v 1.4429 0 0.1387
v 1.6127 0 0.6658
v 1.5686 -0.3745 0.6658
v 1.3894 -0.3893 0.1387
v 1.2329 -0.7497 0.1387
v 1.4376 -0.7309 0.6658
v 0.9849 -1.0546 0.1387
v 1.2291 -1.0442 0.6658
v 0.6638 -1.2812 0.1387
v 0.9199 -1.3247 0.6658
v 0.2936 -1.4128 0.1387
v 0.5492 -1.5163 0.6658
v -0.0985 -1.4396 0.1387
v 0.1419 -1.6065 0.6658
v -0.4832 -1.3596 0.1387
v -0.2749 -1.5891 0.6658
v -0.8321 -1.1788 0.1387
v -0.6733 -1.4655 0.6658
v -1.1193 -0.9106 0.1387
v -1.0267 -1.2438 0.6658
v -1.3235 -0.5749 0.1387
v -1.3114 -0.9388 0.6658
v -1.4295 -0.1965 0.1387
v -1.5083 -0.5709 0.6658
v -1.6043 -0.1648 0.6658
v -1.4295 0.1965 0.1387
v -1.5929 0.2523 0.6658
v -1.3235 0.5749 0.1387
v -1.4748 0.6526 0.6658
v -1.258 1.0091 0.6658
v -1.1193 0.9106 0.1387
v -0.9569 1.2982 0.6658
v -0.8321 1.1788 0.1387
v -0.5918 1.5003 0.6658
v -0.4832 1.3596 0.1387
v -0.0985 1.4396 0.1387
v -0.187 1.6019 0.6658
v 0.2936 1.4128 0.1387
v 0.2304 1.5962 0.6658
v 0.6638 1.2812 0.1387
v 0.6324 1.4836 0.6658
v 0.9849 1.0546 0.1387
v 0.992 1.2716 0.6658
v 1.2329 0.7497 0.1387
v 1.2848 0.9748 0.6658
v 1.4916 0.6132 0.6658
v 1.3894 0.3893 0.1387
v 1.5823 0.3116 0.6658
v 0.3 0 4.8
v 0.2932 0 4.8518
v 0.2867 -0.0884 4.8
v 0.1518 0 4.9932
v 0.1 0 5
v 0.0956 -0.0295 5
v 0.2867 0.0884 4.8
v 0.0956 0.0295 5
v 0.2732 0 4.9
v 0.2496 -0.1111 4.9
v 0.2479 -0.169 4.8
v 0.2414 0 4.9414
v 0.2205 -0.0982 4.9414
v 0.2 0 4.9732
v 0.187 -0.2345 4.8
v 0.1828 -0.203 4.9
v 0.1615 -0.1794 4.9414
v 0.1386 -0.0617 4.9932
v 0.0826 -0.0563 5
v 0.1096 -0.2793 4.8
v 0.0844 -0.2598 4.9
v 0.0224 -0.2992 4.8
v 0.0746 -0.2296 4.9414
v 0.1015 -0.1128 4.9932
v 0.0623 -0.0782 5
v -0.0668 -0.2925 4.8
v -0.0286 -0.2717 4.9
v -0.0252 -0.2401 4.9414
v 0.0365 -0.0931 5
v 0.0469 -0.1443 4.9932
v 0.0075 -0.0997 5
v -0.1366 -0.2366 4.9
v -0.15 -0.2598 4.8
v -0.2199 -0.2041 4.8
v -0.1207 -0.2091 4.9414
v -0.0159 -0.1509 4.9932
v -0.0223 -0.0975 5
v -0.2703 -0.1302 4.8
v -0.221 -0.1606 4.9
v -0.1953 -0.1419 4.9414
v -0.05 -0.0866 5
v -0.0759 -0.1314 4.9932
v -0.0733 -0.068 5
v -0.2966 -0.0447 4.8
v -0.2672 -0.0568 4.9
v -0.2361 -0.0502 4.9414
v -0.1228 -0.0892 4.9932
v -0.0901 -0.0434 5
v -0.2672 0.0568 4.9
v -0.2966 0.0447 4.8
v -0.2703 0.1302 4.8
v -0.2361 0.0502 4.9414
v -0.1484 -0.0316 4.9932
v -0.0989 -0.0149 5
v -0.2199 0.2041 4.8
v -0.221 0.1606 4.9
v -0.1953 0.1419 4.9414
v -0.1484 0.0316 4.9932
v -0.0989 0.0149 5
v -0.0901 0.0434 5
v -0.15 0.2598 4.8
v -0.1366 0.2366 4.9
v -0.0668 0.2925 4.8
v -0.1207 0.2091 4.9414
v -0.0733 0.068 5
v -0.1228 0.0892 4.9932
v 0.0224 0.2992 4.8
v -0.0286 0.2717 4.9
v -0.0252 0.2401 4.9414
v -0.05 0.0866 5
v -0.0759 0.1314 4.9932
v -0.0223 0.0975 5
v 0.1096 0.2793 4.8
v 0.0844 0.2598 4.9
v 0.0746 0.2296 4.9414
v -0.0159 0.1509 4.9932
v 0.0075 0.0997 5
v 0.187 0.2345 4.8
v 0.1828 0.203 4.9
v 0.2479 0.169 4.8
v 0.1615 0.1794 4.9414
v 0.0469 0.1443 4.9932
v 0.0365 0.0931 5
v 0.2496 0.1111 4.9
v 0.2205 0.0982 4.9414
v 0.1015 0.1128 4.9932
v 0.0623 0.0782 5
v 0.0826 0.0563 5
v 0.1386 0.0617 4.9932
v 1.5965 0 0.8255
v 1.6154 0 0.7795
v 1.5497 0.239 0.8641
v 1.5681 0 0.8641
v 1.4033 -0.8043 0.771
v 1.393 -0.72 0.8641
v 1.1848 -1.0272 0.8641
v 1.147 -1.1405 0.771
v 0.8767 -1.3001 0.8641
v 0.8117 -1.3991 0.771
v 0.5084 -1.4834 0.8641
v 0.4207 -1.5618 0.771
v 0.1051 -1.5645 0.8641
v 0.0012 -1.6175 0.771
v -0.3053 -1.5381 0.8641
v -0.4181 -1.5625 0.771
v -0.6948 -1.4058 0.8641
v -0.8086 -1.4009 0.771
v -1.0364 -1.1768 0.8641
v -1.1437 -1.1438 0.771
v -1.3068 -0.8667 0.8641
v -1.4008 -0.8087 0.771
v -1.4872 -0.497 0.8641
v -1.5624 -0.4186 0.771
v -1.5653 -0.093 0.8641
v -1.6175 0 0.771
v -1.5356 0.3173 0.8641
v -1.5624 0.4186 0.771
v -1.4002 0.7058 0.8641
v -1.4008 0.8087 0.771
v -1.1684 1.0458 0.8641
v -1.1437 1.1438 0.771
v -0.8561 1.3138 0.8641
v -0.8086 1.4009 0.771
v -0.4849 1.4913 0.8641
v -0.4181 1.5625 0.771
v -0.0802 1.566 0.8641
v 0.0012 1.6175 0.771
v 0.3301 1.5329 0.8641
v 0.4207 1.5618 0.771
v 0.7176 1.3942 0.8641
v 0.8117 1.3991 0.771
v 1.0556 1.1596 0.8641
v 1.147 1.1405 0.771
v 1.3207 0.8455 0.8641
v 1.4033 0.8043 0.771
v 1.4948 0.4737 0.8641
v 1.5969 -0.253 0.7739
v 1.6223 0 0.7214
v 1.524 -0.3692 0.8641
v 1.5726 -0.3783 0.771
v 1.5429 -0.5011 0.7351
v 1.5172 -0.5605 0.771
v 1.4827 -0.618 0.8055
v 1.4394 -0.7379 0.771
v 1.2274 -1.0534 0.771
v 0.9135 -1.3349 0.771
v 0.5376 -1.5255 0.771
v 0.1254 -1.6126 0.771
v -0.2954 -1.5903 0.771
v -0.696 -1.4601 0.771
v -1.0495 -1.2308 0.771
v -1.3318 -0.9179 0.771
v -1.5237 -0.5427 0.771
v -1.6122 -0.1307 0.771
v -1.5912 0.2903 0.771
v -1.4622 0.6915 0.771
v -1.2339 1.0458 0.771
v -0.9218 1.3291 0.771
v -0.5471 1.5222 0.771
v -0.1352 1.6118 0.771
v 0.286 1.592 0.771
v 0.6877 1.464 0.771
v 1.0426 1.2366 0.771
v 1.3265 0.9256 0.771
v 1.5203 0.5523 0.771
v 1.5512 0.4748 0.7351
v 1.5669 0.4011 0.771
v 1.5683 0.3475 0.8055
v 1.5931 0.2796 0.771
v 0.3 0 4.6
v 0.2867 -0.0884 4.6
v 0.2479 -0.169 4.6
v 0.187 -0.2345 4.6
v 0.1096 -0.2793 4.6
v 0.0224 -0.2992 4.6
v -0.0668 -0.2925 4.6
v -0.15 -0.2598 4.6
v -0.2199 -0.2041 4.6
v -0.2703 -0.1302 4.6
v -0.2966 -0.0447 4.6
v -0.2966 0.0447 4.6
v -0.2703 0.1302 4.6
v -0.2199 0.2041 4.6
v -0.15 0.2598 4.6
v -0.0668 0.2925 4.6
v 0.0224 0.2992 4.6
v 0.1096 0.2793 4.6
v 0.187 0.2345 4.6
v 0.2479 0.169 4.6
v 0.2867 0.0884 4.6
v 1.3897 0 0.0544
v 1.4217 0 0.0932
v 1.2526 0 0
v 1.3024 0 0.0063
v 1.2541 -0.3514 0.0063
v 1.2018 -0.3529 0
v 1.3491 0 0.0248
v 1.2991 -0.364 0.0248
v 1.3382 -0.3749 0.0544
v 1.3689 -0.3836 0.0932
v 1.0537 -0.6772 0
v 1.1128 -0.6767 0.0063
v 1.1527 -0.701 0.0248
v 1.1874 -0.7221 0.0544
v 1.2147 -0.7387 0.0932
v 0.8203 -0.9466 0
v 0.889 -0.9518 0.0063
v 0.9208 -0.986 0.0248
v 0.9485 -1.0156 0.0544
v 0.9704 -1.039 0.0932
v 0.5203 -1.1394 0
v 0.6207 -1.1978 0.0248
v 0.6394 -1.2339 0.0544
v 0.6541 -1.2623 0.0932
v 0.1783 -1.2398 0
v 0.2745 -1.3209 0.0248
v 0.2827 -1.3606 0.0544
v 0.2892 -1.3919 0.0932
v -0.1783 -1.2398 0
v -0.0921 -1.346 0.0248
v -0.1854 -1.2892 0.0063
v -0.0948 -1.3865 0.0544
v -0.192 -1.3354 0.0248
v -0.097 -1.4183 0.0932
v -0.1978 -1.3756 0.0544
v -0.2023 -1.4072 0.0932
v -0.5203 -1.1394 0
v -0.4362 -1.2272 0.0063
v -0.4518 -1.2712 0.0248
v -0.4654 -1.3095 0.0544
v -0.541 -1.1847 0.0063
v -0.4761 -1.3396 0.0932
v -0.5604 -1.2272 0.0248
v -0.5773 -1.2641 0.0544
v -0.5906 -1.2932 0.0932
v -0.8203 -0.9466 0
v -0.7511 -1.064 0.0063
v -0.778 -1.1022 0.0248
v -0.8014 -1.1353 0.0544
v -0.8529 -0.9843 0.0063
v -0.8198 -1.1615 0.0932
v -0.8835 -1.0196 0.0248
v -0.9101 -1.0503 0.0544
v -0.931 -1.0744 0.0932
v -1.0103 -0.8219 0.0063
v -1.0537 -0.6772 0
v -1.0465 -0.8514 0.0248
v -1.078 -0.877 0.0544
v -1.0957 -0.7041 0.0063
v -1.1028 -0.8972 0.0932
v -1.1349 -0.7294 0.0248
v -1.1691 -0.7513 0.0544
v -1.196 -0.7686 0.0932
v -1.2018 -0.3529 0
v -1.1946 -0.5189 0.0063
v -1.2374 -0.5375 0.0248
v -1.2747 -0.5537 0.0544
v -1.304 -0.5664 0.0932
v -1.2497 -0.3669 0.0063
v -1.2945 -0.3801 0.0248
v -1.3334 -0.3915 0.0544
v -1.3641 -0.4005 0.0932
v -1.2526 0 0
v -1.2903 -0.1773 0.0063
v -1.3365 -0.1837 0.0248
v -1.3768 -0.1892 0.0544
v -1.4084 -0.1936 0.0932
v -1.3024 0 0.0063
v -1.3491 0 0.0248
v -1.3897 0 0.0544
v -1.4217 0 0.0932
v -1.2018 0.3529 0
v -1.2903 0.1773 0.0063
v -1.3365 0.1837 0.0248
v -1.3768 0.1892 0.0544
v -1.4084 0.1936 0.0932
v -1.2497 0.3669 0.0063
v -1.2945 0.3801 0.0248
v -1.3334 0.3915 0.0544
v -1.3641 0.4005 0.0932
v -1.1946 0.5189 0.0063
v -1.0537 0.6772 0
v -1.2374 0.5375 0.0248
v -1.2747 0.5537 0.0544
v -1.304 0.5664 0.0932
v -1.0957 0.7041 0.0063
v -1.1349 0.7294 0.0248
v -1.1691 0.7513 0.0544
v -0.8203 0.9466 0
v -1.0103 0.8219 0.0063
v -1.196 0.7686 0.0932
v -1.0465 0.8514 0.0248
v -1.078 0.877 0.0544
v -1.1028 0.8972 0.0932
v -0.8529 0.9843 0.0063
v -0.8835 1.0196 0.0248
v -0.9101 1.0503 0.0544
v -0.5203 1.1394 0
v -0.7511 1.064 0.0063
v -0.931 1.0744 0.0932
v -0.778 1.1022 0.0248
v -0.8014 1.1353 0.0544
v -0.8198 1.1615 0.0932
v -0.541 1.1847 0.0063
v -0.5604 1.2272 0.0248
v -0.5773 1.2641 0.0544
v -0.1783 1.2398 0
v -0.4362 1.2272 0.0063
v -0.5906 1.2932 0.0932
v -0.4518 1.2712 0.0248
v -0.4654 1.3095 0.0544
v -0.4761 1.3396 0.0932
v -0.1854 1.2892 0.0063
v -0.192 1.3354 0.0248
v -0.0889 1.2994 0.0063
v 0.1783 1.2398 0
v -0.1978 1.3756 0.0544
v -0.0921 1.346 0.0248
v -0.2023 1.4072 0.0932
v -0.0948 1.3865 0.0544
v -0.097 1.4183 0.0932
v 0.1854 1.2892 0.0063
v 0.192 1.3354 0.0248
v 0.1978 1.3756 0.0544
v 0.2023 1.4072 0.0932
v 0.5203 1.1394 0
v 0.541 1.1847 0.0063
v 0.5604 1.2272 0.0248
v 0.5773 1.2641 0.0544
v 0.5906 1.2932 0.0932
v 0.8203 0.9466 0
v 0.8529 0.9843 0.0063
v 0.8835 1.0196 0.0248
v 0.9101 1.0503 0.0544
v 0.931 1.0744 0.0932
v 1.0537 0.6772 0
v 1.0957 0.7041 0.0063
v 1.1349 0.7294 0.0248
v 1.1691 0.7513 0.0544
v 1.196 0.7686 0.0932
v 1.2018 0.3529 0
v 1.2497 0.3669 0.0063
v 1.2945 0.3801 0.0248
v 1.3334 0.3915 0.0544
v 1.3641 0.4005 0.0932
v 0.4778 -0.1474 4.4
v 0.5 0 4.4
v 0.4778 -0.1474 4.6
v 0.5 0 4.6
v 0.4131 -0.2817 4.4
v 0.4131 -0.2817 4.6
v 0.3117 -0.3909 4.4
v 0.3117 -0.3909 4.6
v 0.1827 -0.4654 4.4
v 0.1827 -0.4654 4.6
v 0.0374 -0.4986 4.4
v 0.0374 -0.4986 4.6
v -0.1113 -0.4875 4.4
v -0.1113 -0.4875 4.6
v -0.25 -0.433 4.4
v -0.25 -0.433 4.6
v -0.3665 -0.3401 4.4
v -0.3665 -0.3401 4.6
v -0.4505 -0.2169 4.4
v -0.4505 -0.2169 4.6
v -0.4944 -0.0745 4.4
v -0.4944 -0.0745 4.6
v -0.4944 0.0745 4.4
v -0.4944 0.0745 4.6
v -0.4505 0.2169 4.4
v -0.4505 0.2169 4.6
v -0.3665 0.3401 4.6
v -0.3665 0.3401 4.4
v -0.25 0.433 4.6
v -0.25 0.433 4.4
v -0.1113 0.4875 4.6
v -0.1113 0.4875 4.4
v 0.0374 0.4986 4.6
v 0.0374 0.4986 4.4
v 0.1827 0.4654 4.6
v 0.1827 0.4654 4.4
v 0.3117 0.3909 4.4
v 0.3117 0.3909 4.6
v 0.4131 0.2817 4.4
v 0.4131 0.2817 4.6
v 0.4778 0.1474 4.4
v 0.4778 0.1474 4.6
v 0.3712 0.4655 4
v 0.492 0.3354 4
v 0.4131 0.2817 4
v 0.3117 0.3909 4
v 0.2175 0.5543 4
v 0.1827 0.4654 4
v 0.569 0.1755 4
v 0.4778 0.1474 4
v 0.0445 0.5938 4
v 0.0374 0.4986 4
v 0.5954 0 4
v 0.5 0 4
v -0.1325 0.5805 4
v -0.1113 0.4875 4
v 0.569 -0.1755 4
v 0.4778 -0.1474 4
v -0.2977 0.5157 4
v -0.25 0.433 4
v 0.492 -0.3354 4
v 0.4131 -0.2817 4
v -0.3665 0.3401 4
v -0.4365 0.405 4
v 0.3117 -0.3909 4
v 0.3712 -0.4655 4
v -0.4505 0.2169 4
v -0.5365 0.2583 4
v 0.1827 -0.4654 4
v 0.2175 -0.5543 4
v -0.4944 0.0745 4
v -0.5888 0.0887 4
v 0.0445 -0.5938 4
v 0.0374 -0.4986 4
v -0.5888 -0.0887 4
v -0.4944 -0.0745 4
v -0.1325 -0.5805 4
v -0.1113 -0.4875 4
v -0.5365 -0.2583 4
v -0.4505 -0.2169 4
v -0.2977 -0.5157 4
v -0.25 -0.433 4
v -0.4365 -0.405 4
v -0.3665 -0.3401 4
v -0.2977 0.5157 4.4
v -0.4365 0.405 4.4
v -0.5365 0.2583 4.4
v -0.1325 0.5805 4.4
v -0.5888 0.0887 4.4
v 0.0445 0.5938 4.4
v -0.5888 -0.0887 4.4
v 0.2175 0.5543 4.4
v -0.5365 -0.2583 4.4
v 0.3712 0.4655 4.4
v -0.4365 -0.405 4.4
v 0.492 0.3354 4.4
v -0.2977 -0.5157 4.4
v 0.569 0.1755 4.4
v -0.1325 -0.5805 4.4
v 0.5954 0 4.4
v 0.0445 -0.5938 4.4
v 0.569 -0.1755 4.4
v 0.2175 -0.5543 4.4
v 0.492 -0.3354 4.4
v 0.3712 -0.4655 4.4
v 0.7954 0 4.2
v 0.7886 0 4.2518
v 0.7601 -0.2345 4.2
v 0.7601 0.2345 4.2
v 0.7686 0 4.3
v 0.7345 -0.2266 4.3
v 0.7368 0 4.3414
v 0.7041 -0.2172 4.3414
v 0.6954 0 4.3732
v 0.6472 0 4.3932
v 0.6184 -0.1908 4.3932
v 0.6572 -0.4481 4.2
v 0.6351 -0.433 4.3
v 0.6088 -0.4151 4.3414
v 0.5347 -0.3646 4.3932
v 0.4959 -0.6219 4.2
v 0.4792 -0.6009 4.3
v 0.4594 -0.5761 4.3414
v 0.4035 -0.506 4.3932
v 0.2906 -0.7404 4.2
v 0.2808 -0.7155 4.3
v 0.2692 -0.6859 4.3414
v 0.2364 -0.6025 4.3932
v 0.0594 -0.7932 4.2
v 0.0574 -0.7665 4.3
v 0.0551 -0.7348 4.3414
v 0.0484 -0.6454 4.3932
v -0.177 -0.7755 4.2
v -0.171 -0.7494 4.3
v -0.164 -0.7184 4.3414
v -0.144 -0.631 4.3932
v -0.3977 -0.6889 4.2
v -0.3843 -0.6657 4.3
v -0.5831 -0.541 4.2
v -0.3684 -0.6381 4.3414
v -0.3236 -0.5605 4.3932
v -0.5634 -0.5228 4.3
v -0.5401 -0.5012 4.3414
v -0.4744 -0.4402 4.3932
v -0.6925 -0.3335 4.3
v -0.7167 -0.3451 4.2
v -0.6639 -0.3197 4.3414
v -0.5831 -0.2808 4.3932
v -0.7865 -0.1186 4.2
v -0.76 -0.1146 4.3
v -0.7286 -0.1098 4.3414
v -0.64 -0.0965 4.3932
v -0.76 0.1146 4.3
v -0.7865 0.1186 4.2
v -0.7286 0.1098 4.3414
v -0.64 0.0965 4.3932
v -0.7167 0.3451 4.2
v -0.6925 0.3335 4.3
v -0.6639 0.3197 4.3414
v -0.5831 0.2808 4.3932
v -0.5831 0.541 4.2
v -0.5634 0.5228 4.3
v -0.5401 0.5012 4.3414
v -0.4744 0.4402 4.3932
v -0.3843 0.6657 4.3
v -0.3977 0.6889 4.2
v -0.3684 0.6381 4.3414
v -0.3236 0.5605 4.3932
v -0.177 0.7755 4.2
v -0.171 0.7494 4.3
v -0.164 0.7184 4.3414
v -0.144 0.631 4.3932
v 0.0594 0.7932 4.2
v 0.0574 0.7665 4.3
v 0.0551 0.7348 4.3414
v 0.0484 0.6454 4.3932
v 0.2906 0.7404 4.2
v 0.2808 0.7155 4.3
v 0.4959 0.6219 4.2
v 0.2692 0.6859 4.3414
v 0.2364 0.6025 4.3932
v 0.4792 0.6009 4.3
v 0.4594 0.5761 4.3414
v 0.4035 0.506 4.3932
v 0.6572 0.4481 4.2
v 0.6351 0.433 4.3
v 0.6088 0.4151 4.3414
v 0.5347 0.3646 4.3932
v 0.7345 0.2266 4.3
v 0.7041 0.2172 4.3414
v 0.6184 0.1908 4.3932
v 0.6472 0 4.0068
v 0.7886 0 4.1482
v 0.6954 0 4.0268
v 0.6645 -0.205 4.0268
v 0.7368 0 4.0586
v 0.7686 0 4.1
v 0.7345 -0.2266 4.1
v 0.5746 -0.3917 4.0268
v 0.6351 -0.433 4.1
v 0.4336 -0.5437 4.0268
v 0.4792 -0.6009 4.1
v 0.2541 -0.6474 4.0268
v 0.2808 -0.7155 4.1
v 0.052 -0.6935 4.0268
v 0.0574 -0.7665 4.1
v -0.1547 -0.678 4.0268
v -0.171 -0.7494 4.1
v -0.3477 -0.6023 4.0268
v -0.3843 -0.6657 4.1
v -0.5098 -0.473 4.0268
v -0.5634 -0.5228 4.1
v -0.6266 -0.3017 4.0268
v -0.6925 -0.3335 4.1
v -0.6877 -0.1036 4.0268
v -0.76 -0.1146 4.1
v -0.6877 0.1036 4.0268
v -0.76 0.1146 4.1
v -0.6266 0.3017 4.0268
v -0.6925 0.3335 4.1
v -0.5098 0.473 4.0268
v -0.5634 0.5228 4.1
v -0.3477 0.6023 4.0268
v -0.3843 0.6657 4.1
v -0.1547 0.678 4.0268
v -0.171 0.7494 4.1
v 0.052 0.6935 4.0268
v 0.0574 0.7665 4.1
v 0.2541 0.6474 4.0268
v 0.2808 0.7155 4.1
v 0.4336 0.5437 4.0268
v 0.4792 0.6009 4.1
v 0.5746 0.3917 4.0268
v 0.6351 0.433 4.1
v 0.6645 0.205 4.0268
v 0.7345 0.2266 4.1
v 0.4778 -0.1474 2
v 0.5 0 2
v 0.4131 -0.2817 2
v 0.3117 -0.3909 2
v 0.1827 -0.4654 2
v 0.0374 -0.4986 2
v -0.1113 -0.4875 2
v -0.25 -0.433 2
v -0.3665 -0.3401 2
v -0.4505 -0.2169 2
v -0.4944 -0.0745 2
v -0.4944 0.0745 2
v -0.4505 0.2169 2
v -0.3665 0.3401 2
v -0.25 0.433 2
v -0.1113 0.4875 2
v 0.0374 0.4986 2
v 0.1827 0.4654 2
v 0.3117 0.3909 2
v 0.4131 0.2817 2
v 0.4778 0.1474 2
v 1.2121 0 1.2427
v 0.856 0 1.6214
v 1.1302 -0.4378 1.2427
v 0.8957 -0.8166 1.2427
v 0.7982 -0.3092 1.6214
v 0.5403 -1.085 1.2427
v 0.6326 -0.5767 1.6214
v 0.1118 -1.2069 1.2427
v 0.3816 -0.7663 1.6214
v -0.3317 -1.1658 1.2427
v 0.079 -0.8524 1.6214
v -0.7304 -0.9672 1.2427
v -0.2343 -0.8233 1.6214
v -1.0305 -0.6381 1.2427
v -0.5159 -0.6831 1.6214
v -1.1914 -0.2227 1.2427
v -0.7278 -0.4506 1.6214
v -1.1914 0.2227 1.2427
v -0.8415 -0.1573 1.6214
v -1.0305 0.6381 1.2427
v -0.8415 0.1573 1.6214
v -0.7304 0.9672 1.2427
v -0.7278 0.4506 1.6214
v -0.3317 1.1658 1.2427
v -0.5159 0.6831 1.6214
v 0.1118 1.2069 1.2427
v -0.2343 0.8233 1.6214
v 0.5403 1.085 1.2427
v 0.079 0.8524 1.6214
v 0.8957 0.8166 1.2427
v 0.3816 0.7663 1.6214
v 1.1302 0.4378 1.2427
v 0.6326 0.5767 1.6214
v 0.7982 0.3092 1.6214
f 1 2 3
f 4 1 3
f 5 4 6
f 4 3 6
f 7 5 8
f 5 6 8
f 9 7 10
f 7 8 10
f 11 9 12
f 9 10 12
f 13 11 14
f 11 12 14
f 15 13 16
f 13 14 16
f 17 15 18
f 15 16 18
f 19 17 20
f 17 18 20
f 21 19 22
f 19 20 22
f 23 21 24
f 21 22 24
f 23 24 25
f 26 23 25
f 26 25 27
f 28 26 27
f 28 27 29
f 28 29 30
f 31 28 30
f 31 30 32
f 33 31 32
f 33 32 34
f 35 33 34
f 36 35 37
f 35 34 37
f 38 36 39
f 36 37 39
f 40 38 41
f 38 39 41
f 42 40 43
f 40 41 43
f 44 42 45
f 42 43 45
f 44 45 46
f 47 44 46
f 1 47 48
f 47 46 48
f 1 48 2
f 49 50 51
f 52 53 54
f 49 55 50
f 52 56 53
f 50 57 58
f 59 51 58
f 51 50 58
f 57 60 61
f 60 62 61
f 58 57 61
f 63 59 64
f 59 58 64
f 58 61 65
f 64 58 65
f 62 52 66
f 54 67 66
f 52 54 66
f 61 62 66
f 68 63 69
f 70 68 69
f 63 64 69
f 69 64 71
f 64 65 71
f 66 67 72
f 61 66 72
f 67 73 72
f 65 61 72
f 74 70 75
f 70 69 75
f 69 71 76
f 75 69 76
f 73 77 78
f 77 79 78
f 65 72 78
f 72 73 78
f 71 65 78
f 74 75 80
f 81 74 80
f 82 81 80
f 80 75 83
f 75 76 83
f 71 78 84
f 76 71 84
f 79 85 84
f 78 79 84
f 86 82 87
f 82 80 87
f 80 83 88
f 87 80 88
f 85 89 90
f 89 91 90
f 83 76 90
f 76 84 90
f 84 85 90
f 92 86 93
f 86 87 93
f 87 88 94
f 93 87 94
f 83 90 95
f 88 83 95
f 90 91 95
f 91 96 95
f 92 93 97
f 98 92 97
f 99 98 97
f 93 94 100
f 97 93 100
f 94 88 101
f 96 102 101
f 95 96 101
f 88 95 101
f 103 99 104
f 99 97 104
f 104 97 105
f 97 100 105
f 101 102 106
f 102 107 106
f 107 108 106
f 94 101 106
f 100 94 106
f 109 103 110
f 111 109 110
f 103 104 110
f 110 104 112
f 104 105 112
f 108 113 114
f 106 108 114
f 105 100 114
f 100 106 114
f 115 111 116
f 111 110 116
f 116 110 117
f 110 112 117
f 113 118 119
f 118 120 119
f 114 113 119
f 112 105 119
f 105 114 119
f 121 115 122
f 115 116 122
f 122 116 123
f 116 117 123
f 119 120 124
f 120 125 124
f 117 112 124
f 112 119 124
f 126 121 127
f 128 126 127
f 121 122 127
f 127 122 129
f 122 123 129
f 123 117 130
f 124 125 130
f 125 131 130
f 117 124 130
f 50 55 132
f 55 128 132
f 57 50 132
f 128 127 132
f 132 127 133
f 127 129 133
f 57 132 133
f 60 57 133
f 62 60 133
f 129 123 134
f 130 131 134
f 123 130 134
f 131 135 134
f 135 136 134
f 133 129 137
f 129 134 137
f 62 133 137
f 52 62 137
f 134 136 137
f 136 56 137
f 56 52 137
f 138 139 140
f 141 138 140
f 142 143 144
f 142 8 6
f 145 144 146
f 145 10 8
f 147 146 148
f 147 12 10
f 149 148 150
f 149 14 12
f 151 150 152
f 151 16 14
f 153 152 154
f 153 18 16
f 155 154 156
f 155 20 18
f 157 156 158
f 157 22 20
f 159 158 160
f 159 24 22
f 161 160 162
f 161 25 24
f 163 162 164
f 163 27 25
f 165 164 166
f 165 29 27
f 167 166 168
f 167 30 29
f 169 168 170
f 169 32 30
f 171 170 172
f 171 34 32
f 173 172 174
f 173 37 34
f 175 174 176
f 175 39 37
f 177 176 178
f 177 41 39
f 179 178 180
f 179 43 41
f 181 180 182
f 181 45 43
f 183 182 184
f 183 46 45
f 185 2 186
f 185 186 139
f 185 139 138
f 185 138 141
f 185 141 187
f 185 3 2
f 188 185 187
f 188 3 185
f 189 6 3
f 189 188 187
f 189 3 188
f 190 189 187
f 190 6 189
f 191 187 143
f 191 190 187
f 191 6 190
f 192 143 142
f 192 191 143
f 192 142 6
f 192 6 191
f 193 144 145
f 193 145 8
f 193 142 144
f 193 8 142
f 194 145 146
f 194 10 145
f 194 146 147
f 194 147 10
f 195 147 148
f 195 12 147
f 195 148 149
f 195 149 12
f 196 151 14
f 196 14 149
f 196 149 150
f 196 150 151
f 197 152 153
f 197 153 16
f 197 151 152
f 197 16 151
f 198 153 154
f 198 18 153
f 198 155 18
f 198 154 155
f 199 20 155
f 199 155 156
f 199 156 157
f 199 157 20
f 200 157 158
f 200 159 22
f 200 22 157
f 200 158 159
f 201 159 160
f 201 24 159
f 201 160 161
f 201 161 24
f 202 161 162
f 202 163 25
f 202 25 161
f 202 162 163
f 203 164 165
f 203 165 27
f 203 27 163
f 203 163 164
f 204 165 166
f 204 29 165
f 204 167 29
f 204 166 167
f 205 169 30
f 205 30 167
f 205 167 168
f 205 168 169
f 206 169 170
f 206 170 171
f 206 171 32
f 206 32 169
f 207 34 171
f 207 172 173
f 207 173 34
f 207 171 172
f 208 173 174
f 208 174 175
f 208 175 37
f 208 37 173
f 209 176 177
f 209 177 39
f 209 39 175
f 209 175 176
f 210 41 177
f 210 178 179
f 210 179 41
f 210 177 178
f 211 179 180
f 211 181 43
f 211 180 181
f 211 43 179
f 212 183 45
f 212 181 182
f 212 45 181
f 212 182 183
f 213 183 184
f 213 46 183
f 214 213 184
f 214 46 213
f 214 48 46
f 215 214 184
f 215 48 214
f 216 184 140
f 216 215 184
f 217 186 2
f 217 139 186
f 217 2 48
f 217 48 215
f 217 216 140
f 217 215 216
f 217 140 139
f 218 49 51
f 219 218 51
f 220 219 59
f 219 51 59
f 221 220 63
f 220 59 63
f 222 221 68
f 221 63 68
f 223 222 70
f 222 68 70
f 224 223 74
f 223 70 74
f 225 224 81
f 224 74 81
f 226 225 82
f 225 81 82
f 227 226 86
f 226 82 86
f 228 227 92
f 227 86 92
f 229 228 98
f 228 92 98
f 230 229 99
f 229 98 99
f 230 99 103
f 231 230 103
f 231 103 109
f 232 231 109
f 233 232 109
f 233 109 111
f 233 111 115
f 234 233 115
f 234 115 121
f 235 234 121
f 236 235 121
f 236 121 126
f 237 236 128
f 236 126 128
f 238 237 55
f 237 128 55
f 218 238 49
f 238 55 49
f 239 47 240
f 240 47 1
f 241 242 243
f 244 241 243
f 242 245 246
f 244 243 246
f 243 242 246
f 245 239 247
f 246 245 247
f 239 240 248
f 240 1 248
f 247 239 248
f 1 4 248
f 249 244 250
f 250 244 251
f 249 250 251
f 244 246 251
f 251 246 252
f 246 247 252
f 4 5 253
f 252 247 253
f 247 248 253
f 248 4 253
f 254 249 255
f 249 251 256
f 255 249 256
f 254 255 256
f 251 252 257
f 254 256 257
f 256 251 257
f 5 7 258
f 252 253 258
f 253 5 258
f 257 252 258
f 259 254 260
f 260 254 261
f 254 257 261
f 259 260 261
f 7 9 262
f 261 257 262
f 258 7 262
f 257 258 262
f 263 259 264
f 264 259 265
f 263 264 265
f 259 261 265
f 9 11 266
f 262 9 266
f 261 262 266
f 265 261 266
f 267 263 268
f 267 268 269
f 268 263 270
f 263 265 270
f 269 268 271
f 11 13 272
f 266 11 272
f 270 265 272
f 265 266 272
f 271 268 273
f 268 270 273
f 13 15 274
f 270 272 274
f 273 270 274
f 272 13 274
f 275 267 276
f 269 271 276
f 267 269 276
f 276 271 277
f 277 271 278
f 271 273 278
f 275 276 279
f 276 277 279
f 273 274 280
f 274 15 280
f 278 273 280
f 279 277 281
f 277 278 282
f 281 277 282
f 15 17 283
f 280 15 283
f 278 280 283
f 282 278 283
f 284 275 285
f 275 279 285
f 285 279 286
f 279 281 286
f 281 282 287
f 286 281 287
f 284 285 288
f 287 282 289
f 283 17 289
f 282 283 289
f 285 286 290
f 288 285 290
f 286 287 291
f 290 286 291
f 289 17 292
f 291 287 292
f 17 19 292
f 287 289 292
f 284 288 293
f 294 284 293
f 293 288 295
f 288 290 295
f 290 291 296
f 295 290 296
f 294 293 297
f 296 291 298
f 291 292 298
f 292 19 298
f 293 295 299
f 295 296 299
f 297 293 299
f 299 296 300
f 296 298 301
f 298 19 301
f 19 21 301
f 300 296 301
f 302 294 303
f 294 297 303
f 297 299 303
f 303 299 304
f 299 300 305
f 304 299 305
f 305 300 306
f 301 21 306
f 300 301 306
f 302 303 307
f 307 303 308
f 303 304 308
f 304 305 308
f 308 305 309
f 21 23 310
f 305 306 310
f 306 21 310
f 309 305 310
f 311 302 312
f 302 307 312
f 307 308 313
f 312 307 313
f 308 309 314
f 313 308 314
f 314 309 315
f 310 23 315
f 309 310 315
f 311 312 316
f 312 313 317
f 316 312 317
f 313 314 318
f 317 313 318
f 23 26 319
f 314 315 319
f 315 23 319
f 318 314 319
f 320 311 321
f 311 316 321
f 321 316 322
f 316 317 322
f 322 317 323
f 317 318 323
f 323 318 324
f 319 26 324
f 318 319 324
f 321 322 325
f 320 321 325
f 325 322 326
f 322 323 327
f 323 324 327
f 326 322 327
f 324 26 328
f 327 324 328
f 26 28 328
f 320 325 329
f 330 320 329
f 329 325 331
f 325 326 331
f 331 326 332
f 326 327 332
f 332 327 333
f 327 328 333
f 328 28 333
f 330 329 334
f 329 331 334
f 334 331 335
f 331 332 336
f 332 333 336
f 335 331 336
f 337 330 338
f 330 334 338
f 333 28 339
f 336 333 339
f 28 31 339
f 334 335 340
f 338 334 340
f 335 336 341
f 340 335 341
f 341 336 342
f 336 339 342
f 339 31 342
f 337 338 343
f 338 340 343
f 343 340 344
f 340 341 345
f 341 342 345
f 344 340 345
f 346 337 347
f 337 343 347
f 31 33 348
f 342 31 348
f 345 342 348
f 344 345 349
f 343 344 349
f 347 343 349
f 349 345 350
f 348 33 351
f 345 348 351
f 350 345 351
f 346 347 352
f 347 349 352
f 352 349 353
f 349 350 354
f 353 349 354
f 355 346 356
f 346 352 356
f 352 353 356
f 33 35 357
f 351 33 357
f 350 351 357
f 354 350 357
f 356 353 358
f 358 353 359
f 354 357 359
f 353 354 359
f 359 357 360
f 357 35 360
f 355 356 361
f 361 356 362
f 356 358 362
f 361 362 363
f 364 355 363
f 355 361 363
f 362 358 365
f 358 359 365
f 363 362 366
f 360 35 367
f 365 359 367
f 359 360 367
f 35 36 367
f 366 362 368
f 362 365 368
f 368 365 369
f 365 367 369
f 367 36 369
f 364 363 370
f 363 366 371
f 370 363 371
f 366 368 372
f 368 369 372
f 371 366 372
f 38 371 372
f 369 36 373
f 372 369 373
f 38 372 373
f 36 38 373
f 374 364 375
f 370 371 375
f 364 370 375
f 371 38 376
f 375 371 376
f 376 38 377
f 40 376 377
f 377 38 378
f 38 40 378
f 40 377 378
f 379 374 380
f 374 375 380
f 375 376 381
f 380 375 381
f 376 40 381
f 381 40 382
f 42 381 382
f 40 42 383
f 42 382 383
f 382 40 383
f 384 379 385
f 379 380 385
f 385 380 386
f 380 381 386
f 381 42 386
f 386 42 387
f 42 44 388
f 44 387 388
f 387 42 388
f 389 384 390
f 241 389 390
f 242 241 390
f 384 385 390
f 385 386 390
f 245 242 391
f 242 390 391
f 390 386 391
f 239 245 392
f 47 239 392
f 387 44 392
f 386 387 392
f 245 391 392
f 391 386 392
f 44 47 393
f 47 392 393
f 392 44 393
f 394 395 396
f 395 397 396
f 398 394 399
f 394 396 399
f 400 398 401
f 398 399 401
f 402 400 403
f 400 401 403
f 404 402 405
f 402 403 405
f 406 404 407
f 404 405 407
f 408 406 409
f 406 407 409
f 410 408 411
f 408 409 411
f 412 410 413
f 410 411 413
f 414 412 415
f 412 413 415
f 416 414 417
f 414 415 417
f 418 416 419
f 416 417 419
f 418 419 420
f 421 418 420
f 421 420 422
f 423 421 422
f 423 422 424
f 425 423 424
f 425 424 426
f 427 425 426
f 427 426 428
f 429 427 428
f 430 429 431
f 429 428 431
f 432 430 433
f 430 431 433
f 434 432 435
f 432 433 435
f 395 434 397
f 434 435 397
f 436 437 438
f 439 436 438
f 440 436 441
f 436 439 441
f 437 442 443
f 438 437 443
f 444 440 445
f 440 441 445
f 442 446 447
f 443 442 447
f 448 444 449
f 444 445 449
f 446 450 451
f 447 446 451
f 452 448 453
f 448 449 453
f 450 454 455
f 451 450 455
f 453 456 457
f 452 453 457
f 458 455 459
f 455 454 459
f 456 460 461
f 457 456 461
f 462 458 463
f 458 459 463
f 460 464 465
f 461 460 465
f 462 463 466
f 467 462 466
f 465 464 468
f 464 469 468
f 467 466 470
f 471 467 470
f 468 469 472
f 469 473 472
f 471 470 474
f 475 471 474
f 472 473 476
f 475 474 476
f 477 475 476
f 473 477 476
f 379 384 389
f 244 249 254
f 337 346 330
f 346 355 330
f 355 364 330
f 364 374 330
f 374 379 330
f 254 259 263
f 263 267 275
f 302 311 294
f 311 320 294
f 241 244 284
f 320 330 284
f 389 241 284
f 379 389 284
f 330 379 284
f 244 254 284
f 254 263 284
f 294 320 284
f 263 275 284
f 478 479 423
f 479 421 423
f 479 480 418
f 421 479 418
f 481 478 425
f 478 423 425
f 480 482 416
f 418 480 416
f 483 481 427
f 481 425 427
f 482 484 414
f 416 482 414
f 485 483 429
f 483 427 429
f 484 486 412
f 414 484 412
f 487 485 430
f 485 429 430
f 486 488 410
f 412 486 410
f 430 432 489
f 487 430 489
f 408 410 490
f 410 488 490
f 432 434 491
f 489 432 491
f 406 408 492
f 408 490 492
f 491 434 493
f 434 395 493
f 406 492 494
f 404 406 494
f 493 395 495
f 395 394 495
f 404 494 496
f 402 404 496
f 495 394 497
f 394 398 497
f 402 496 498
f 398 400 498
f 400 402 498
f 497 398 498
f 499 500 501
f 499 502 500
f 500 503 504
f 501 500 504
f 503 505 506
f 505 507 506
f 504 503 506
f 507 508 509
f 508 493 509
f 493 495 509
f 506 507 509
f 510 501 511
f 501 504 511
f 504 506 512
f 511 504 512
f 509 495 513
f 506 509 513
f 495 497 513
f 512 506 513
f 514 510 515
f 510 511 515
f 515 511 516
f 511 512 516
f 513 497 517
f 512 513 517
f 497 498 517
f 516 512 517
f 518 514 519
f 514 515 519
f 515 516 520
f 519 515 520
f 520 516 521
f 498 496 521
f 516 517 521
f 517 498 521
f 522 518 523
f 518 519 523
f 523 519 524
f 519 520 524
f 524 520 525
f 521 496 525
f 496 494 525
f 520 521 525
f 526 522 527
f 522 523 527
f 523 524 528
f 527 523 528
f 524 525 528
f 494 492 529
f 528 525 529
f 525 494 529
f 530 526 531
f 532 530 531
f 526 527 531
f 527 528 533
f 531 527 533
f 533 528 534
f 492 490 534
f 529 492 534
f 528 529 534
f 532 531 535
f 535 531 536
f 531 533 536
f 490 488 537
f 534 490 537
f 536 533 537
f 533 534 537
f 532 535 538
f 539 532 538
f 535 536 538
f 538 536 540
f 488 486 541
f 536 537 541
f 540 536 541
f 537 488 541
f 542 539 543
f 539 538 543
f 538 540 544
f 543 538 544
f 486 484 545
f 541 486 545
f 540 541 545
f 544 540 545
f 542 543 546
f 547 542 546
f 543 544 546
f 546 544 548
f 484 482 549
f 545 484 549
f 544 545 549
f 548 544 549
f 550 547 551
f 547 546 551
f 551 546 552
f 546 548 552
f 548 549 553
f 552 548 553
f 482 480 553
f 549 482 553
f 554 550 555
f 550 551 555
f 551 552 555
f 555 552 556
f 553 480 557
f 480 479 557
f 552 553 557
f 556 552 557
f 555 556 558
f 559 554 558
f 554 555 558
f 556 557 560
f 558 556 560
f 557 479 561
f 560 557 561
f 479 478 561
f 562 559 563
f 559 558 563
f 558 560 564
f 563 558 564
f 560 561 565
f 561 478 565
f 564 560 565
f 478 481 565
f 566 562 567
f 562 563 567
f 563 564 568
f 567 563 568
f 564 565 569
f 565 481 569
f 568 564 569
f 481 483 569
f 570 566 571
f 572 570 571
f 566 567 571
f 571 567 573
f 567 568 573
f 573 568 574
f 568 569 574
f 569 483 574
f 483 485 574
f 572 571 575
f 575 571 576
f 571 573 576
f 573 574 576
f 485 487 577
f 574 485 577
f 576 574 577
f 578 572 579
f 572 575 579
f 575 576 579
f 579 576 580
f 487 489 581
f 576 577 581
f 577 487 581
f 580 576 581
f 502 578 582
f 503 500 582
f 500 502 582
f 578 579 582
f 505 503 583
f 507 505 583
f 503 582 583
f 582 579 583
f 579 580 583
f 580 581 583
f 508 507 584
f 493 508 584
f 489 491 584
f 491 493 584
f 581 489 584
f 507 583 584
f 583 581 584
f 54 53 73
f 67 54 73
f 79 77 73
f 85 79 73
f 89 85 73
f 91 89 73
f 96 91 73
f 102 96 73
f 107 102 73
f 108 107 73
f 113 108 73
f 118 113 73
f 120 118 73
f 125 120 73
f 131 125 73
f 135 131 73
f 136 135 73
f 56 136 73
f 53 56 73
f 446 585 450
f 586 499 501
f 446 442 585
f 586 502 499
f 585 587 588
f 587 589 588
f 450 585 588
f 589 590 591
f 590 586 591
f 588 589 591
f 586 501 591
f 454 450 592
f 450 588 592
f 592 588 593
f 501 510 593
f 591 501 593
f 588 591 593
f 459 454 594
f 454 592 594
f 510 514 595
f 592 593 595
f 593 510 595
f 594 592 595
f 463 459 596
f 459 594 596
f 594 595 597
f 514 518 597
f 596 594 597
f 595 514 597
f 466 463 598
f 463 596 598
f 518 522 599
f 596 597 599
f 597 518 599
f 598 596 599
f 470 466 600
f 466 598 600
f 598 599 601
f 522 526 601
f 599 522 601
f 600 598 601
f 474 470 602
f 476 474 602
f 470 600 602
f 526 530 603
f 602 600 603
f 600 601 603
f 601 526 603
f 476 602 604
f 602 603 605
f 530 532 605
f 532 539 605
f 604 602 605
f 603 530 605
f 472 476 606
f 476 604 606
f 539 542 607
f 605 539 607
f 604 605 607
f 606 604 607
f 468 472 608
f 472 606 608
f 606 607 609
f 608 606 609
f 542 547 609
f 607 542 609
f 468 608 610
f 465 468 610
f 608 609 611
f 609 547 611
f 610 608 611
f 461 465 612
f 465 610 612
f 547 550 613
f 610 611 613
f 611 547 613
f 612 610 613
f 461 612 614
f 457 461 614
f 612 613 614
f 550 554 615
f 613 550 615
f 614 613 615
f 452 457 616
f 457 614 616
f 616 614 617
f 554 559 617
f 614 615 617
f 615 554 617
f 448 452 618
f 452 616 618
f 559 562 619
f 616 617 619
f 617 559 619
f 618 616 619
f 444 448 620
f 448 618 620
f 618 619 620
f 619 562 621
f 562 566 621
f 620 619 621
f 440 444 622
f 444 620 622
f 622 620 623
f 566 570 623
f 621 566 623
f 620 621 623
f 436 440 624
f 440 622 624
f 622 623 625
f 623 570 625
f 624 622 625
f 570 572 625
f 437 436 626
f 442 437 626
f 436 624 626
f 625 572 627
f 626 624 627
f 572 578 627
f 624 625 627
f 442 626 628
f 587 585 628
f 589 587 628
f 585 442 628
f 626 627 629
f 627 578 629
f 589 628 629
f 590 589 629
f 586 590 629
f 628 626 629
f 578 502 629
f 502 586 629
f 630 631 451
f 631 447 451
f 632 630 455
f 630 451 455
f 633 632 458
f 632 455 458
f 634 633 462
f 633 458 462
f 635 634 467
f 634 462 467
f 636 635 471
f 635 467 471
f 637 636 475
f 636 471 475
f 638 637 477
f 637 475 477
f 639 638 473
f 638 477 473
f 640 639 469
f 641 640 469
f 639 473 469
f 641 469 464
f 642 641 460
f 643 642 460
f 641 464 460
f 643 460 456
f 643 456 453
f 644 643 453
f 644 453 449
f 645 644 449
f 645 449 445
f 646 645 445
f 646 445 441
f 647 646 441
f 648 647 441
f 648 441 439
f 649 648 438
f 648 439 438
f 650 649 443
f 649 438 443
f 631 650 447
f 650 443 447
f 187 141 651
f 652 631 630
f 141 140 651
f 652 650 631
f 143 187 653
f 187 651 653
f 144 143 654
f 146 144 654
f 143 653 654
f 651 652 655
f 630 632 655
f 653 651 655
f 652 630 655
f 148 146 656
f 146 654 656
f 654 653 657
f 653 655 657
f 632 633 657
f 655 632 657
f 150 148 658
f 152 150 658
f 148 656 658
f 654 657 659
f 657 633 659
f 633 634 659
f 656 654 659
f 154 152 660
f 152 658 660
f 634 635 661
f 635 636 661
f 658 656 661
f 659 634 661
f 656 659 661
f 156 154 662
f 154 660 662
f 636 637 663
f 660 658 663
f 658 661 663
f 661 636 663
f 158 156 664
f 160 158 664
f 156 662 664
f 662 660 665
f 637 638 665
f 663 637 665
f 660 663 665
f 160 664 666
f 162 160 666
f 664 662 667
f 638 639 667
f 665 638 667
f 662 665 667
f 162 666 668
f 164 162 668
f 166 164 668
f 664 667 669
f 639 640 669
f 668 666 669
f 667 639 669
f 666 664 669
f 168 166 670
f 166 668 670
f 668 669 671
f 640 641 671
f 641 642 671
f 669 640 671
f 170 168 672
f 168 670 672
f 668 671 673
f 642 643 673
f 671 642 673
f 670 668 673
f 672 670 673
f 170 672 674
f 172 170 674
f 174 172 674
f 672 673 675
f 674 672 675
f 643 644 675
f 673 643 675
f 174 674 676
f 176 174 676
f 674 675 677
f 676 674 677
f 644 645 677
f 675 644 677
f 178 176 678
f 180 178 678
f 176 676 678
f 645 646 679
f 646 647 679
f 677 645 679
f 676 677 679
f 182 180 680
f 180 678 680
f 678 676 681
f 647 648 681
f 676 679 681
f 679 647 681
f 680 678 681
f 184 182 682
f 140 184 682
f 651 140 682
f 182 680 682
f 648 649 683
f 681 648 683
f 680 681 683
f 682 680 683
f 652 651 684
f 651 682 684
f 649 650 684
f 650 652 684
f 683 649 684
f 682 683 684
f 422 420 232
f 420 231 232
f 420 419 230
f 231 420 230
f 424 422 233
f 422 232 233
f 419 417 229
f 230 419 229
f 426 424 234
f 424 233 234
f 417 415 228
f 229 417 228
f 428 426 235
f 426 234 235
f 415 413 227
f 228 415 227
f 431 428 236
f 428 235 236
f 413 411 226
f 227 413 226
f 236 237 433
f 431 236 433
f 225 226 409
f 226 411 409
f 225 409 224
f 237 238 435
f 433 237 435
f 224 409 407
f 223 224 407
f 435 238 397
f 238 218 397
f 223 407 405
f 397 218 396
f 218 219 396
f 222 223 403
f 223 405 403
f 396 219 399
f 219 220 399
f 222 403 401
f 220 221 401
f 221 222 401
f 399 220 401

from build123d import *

# Parameters (mm, degrees)
F2_R = 0.2
F3_R = 0.2
F4_R = 0.19999


# Not quite as in the source:
# - a fillet or chamfer is up to 0.001 mm smaller than in the source, because OpenCascade refuses the exact size


with BuildPart() as f1:
    # F0 (on Front) → F1 (revolve)
    with BuildSketch(Plane.XZ):
        Polygon((0, 5), (0, 0), (1.3982689707, 0), (1.6489363067, 0.7781155359), (0.5, 2), (0.5, 4), (0.7954219793, 4), (0.7954219793, 4.4), (0.5, 4.4), (0.5, 4.6), (0.3, 4.6), (0.3, 5), align=None)
    revolve(axis=Axis((0, 0, 2.5), (0, 0, -1)))

    # F2
    f2_edges = [f1.edges().sort_by_distance(p)[0] for p in [
        (-1.398269, 0, 0),
    ]]
    fillet(f2_edges, radius=F2_R)

    # F3
    f3_edges = [f1.edges().sort_by_distance(p)[0] for p in [
        (-1.648936, 0, 0.778116),
        (-0.3, 0, 5),
    ]]
    fillet(f3_edges, radius=F3_R)

    # F4 (radius 0.2 in the source; OpenCascade refuses exactly that, so slightly less here)
    f4_edges = [f1.edges().sort_by_distance(p)[0] for p in [
        (-0.795422, 0, 4.4),
        (-0.795422, 0, 4),
    ]]
    fillet(f4_edges, radius=F4_R)


solid = f1.part
